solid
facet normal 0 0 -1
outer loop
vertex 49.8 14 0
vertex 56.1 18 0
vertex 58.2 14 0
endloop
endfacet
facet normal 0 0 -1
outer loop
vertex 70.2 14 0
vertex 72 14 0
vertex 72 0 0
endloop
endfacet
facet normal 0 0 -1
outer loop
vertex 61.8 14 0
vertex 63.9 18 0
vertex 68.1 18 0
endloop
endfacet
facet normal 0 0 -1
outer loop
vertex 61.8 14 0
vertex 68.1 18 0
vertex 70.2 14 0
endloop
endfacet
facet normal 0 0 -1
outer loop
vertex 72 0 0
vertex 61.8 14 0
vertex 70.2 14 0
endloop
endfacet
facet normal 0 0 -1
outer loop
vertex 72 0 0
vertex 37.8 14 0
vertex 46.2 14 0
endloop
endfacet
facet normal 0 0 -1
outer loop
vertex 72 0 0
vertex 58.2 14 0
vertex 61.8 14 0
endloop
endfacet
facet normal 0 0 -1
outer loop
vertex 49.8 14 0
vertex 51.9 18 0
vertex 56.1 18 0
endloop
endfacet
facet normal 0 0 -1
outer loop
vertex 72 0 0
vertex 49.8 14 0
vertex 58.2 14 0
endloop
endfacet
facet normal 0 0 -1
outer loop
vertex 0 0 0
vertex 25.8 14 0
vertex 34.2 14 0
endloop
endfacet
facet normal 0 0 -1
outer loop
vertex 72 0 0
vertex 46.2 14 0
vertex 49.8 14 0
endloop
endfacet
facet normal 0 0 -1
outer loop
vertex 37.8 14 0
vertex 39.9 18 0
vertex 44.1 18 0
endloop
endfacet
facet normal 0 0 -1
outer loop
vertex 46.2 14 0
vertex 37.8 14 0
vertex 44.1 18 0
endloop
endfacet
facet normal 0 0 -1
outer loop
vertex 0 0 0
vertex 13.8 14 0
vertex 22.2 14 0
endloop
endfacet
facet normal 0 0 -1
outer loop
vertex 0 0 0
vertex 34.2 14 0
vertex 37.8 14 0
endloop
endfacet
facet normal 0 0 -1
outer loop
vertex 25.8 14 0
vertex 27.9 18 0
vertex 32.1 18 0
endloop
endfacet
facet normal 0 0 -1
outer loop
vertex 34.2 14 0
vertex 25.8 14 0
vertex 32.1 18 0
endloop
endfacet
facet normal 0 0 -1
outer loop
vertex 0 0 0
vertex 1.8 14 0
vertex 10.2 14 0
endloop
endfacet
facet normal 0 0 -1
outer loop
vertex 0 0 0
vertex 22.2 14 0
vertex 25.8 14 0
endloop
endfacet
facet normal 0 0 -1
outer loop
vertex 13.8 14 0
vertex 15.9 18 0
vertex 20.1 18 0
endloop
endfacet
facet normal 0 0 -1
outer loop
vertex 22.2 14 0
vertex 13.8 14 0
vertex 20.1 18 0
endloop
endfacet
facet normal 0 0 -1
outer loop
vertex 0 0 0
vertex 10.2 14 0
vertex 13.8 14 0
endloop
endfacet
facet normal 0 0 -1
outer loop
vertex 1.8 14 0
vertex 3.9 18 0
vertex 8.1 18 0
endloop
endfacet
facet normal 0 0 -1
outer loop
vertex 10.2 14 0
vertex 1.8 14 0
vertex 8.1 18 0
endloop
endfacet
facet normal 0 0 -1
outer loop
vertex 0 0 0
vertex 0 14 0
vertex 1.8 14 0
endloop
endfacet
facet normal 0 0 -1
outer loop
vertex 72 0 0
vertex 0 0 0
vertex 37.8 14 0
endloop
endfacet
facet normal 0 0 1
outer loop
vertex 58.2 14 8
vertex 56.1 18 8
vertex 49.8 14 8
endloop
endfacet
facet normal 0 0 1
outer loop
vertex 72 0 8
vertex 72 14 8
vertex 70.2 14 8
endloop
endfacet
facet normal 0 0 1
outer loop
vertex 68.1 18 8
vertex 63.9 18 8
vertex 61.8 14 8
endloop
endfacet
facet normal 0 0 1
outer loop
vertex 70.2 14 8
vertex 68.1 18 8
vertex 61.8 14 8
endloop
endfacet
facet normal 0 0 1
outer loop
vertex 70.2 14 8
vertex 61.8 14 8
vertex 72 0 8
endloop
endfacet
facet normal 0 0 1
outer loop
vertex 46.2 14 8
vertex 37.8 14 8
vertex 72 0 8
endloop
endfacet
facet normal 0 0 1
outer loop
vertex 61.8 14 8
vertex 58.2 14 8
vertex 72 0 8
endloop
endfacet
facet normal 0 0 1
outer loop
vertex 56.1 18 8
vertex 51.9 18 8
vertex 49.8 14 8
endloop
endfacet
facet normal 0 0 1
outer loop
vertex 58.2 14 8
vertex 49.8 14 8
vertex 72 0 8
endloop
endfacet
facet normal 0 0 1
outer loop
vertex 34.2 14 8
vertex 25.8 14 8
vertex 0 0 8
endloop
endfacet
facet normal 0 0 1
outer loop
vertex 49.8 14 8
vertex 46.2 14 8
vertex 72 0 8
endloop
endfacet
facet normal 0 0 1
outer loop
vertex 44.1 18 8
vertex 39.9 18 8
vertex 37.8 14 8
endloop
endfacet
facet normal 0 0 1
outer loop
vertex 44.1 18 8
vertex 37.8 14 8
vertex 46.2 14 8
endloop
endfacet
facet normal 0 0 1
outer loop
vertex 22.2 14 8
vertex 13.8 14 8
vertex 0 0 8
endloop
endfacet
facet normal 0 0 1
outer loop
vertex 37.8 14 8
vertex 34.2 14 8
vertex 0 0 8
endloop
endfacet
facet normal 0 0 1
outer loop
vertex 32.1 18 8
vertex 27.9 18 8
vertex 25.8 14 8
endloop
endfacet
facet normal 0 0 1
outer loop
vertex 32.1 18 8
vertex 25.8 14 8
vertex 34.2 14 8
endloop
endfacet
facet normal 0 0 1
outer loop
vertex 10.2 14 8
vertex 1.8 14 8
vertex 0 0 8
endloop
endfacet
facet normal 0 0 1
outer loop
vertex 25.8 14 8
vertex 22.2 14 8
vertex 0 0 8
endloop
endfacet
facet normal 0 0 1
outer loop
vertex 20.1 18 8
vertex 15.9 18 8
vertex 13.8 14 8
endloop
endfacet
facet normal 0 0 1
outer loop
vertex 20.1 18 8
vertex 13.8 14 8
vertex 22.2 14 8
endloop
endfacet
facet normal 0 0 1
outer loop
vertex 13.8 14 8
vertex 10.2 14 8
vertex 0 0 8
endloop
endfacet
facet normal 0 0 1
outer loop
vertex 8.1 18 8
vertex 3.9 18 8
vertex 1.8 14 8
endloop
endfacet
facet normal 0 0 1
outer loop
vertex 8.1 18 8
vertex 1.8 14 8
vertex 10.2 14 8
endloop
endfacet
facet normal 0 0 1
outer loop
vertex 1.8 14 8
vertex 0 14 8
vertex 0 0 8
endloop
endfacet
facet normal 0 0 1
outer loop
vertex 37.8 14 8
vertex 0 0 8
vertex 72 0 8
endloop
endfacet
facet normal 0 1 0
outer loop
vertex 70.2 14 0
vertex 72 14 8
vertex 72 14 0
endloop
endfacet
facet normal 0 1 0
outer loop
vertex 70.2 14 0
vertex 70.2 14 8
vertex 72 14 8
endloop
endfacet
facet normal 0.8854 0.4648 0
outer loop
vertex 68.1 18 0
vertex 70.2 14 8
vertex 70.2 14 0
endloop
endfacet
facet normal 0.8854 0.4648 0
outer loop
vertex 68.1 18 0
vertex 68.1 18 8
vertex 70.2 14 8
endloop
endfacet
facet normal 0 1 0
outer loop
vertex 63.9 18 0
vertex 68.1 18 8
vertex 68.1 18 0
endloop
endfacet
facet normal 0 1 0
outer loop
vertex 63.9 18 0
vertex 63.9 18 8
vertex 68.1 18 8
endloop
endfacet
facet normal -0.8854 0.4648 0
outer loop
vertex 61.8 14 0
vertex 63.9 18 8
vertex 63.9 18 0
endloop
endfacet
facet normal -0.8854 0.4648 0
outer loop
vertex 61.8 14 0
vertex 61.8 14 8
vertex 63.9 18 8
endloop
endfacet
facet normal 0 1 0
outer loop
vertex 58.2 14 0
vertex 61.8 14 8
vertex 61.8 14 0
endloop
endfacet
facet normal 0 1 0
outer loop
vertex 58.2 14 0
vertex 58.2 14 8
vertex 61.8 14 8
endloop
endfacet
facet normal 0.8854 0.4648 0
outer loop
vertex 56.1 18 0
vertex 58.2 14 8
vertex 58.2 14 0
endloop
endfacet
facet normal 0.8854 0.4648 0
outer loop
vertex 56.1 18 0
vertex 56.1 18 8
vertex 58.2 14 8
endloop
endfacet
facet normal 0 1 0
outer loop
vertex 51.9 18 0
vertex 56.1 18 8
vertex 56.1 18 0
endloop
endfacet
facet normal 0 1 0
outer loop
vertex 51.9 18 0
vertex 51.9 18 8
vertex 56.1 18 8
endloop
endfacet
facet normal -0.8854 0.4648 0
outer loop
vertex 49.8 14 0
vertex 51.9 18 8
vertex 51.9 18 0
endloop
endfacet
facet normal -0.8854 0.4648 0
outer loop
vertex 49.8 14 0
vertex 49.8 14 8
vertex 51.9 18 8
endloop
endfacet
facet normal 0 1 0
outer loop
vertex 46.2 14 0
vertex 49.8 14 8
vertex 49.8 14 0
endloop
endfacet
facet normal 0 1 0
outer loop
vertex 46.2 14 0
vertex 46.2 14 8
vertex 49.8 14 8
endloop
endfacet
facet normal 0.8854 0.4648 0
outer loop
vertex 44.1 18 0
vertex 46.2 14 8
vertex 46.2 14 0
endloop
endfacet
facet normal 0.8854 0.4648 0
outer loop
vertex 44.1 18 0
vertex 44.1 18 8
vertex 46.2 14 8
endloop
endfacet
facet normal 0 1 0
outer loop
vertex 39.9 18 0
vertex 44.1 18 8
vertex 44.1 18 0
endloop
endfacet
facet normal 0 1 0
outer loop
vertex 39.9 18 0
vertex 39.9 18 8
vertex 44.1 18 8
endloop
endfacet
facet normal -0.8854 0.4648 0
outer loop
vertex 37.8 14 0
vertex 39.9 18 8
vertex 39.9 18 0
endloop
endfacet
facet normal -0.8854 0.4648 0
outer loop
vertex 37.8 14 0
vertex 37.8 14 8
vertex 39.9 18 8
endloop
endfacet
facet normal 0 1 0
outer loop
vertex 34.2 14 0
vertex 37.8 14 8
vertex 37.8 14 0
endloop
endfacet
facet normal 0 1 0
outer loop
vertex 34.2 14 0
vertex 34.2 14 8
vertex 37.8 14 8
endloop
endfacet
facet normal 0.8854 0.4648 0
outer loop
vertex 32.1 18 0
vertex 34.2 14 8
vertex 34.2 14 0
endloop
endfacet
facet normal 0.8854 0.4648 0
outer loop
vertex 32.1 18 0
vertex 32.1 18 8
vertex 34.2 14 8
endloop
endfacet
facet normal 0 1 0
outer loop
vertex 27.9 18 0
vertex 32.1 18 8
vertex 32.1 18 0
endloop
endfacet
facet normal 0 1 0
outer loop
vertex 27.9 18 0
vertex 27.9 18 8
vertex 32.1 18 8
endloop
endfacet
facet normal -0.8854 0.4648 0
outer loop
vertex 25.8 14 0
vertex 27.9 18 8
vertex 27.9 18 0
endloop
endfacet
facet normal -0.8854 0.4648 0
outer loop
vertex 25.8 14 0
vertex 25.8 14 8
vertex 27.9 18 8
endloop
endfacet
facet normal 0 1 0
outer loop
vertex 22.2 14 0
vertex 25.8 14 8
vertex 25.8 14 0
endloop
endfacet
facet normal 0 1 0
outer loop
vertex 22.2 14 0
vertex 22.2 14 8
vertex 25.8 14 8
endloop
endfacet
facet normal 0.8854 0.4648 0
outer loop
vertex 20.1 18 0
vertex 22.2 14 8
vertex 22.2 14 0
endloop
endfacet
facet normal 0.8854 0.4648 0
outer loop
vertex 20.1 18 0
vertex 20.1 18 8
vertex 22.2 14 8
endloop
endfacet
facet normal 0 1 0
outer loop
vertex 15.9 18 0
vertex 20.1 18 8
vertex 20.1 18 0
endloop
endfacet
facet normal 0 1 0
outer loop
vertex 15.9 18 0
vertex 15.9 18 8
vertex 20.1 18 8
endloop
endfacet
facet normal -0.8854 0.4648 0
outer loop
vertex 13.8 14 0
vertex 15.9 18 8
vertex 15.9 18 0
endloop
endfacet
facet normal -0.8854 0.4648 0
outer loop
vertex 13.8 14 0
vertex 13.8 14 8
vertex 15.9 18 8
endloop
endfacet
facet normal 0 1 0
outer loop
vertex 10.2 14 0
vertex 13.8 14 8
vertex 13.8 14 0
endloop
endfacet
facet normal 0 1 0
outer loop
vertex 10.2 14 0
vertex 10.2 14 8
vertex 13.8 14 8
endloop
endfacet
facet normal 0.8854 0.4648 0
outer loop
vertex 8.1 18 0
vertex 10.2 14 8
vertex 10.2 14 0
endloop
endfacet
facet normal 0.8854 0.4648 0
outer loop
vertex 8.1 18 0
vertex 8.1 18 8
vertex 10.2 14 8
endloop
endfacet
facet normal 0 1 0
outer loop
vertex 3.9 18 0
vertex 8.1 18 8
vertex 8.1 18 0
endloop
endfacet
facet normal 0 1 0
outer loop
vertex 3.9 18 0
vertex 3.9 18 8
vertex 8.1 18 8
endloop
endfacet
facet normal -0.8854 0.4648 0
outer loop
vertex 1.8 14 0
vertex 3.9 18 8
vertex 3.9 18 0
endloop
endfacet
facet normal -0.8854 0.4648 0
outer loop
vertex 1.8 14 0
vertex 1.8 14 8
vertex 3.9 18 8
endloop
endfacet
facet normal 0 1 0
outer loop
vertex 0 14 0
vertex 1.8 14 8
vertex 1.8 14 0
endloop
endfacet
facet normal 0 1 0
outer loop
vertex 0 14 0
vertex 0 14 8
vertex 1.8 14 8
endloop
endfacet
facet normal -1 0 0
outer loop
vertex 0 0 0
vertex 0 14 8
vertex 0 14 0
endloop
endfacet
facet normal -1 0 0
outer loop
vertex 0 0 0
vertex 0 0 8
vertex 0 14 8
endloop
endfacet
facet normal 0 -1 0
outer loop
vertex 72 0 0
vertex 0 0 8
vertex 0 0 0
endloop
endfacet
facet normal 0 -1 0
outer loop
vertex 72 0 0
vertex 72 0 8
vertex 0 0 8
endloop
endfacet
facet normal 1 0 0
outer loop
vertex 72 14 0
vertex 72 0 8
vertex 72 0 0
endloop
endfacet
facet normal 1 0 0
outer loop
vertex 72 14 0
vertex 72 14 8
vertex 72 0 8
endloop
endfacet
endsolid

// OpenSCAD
$fn = 32;

// ----------------------------------------------------------------------
// Gear rack: 6 teeth, pitch 12 mm
// ----------------------------------------------------------------------

// --- parameters (mm) ---
teeth = 6;                // number of teeth
pitch = 12;               // tooth pitch, X
root_w = 8.4;             // tooth width at the root
tip_w = 4.2;              // tooth width at the tip
base_h = 14;              // rack body height, Y
tooth_h = 4;              // tooth height above the body
plate_t = 8;              // rack width, Z (extrusion height)

rack_l = teeth * pitch;  // overall length
total_h = base_h + tooth_h;  // overall height

profile = [[0, 0], [72, 0], [72, 14], [70.2, 14], [68.1, 18], [63.9, 18], [61.8, 14], [58.2, 14], [56.1, 18], [51.9, 18], [49.8, 14], [46.2, 14], [44.1, 18], [39.9, 18], [37.8, 14], [34.2, 14], [32.1, 18], [27.9, 18], [25.8, 14], [22.2, 14], [20.1, 18], [15.9, 18], [13.8, 14], [10.2, 14], [8.1, 18], [3.9, 18], [1.8, 14], [0, 14]];  // primary outline, 28 points, counter clockwise

// --- the one profile operation ---
linear_extrude(height = plate_t) polygon(points = profile);
